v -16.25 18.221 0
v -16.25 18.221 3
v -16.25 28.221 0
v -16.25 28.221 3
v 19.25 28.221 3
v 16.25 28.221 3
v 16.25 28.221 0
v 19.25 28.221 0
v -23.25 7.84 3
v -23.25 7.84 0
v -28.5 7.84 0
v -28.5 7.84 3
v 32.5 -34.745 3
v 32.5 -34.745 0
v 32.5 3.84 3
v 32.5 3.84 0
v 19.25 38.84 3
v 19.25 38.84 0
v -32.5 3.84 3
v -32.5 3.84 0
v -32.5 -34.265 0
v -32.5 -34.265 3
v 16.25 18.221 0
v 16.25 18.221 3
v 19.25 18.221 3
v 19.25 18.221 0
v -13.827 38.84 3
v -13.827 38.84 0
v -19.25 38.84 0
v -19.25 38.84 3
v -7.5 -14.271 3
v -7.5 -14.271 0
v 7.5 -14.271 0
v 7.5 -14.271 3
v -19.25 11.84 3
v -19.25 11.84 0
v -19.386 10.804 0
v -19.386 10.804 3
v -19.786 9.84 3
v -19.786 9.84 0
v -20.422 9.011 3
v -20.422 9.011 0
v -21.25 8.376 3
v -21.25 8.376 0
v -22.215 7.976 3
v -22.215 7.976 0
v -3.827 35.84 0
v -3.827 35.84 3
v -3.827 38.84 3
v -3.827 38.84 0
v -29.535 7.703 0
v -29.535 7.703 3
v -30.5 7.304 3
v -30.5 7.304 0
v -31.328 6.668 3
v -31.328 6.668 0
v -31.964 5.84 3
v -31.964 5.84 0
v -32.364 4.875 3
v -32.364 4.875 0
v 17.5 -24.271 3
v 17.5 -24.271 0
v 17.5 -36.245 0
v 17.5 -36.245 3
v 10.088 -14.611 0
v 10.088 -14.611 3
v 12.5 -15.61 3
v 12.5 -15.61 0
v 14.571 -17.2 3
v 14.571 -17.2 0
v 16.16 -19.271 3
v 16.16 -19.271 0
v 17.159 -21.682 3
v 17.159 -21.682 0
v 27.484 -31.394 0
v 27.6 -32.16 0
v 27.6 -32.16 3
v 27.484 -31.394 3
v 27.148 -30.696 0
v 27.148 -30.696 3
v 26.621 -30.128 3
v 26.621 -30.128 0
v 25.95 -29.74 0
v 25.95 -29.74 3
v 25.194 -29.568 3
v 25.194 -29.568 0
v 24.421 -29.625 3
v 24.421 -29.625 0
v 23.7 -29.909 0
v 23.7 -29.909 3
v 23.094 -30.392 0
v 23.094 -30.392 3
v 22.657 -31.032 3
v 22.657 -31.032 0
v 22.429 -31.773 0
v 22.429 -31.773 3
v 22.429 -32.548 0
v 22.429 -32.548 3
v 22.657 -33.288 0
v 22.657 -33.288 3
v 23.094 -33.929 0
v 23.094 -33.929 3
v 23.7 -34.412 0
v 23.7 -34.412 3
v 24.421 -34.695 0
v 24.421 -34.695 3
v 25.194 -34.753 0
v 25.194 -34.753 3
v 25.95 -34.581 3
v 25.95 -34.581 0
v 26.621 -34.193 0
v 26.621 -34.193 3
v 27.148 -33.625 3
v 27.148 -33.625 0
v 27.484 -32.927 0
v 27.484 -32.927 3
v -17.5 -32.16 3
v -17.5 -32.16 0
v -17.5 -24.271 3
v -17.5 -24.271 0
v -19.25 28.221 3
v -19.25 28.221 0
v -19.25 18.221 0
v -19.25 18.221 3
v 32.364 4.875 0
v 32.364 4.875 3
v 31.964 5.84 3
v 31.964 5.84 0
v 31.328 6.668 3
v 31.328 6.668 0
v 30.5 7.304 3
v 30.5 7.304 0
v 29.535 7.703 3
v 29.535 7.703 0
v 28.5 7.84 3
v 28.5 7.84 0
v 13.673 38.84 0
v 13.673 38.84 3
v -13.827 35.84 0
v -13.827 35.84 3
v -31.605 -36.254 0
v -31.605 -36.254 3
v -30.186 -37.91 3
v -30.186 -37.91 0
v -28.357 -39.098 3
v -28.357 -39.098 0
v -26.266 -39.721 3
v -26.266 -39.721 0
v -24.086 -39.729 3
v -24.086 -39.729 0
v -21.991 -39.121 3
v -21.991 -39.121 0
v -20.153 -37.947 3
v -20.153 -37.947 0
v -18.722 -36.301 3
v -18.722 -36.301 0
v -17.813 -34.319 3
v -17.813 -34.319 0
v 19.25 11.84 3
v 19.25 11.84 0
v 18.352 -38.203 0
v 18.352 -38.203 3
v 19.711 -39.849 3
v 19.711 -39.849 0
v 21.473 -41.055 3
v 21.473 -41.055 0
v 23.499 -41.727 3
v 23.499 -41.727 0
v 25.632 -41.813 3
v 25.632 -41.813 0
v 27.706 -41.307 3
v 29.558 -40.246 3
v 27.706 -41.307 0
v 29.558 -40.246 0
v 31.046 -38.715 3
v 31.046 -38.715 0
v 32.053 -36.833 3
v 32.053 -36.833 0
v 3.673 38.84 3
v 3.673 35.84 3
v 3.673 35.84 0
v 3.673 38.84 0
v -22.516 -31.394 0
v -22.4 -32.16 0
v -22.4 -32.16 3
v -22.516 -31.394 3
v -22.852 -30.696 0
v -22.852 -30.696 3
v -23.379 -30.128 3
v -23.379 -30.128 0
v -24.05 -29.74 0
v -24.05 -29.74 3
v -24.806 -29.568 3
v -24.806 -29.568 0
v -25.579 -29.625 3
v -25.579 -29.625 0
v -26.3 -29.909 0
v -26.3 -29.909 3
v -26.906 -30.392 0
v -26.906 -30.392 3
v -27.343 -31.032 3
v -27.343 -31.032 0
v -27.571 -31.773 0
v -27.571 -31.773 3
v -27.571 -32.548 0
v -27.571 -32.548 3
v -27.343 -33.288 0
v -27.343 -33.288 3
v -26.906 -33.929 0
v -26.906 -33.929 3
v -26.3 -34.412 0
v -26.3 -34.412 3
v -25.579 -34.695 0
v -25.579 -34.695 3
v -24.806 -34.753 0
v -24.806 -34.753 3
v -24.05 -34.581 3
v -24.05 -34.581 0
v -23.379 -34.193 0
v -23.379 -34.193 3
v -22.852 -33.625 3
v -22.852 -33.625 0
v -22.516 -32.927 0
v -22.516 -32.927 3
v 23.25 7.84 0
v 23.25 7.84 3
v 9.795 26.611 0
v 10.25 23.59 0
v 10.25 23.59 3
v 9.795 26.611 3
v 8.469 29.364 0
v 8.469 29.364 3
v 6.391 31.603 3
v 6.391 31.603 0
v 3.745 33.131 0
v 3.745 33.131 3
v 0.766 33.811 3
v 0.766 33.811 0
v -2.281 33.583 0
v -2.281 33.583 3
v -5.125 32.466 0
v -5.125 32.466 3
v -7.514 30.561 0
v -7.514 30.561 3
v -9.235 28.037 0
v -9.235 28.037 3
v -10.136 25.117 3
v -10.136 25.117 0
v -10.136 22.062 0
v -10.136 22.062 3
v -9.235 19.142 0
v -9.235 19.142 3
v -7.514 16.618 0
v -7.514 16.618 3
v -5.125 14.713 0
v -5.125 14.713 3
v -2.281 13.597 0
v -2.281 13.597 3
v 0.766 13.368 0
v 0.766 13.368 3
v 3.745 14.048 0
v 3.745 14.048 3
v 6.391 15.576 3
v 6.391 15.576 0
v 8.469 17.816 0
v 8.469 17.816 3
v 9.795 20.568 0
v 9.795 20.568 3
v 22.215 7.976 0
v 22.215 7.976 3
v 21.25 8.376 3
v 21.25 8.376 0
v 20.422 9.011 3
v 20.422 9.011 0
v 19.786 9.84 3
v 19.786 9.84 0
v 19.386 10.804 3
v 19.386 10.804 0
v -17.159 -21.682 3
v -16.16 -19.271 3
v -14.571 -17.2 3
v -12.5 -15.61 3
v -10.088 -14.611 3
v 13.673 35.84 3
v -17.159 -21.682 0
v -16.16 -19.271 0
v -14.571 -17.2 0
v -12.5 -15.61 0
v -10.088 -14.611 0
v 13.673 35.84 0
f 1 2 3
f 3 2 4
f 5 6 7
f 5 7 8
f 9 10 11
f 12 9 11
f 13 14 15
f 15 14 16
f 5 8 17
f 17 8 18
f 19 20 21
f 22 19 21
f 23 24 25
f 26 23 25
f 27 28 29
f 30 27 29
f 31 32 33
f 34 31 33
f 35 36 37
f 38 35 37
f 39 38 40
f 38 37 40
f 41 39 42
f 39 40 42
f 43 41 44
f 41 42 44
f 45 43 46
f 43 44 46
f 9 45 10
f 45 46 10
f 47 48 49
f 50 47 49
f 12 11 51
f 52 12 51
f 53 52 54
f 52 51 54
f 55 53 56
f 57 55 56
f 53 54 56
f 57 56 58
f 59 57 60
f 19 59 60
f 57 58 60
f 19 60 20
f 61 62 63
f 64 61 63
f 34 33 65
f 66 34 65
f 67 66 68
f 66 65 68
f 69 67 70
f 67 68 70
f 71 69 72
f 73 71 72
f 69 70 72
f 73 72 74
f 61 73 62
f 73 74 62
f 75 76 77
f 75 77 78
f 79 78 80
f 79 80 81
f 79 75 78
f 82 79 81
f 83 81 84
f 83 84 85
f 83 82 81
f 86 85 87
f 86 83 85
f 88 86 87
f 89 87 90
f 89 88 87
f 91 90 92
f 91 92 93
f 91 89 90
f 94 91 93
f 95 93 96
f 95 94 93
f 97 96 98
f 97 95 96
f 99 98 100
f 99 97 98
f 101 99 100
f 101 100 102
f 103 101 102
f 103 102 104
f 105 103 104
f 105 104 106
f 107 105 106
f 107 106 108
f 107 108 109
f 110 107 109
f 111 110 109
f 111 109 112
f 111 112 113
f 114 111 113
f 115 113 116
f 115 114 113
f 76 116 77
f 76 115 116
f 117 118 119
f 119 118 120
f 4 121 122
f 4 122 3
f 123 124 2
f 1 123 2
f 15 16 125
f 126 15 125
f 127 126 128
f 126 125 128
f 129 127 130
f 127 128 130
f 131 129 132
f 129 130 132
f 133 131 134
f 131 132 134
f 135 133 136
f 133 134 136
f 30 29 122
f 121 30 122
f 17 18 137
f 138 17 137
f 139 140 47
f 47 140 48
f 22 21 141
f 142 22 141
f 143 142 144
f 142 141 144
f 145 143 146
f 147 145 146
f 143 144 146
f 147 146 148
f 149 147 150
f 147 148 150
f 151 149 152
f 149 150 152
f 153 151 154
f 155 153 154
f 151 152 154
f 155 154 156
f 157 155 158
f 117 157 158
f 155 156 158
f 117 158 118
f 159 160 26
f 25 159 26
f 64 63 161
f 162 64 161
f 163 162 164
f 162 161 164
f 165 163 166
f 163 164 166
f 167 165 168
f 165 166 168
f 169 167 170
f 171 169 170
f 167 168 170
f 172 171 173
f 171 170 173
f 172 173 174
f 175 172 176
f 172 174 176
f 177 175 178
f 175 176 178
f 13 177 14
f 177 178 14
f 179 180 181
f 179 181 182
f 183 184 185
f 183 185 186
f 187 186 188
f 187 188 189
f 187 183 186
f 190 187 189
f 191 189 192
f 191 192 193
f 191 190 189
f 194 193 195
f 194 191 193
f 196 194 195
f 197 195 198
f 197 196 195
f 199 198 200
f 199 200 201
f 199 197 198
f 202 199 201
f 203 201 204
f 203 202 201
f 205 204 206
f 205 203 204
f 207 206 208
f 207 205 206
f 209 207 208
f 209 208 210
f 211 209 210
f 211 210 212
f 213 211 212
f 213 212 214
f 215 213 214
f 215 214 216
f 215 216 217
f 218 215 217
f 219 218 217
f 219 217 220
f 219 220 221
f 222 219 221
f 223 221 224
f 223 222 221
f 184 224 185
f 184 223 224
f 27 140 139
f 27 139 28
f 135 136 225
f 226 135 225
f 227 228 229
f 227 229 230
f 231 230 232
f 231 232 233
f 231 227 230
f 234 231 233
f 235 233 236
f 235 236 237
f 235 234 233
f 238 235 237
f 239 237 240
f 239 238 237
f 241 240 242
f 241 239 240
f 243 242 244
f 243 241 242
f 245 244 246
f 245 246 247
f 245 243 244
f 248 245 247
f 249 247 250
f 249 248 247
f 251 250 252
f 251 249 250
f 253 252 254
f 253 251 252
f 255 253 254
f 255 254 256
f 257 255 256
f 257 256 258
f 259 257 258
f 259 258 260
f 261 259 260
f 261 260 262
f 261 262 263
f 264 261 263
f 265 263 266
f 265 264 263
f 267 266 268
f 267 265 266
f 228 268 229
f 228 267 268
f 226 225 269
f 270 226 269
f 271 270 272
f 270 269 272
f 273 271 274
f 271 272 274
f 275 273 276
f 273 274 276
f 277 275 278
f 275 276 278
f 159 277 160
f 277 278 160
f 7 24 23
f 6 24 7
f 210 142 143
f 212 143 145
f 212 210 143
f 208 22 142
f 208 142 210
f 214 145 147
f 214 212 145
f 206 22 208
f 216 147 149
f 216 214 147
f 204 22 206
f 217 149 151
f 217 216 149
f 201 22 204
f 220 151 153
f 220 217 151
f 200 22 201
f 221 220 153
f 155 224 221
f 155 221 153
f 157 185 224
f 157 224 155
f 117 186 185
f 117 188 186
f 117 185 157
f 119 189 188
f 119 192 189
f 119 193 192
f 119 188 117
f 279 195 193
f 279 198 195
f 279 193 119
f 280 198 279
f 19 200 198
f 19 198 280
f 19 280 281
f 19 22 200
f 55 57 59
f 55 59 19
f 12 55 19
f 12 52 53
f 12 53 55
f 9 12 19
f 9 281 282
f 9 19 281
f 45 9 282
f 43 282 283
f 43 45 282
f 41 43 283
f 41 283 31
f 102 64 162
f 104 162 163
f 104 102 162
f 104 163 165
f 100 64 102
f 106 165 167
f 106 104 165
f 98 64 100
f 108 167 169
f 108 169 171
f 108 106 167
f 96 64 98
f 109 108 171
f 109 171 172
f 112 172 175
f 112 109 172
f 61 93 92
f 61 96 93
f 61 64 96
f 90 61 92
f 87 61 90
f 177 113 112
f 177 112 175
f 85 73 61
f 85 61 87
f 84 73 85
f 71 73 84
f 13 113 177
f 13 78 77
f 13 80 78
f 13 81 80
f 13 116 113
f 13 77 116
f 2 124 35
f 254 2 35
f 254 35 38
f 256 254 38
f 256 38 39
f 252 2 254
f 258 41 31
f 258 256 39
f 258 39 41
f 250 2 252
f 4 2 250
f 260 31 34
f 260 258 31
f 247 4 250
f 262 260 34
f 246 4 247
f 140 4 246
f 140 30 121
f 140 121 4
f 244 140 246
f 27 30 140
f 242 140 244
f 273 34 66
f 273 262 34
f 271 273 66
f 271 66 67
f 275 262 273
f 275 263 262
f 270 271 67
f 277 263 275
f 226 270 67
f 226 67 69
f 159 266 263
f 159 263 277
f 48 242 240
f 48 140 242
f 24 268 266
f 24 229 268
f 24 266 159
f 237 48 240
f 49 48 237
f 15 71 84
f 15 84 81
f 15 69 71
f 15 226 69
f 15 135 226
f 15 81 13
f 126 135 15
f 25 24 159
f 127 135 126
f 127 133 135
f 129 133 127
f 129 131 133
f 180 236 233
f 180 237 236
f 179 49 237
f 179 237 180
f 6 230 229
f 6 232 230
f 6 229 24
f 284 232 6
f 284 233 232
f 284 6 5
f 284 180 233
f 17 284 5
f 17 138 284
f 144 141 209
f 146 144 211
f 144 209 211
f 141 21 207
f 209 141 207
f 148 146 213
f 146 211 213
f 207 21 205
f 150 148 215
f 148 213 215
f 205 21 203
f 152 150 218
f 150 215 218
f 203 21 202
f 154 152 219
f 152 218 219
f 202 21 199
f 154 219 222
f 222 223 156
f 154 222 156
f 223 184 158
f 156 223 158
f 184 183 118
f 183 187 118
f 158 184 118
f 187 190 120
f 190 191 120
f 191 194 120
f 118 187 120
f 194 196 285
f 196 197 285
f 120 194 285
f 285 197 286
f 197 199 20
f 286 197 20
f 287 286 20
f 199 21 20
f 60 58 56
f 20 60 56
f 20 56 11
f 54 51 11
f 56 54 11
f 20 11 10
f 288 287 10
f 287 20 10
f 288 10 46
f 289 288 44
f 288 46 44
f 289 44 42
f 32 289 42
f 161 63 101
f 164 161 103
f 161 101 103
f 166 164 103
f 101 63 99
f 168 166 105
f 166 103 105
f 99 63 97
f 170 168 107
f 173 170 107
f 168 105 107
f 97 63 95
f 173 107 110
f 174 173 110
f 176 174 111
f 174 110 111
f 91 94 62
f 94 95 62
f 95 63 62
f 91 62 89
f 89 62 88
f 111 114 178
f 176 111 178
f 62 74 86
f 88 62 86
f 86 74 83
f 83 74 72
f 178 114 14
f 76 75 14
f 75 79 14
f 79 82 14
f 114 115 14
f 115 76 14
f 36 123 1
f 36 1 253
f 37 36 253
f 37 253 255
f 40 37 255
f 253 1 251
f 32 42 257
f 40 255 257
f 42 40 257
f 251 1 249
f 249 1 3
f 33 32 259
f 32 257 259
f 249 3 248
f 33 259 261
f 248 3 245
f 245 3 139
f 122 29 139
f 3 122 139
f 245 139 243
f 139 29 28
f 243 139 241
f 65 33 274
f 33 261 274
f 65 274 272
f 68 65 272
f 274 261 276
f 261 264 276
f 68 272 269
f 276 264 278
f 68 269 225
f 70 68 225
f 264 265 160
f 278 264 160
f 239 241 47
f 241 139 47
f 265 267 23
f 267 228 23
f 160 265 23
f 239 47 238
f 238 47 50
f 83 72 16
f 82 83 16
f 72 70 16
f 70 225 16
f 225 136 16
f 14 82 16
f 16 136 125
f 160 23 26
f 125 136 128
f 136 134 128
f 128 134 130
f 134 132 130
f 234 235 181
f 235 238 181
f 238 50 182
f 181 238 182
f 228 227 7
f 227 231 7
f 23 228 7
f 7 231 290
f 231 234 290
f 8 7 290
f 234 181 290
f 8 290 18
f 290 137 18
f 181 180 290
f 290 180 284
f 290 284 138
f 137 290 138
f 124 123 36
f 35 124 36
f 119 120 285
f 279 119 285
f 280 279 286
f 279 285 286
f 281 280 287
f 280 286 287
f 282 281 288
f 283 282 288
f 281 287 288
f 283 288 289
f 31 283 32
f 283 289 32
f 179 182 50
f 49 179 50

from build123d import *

# Parameters (mm, degrees)
SKETCH1_R           = 2.6
SKETCH1_R_2         = 10.25
BOSS_EXTRUDE1_DEPTH = 3
SKETCH2_W           = 3
SKETCH2_H           = 10
SKETCH2_W_2         = 10
SKETCH2_H_2         = 3
CUT_EXTRUDE1_DEPTH  = 3


with BuildPart() as part:
    # Sketch1 → Boss-Extrude1 (new body)
    with BuildSketch(Plane.XY):
        with BuildLine():
            Line((-32.5, -1.160301848), (-32.5, -34.265434942))
            ThreePointArc((-32.5, -34.265434942), (-24.085532921, -39.728848894), (-17.5, -32.160301848))
            Line((-17.5, -32.160301848), (-17.5, -24.27061763))
            ThreePointArc((-17.5, -24.27061763), (-14.571067812, -17.199549819), (-7.5, -14.27061763))
            Line((-7.5, -14.27061763), (7.5, -14.27061763))
            ThreePointArc((7.5, -14.27061763), (14.571067812, -17.199549819), (17.5, -24.27061763))
            Line((17.5, -24.27061763), (17.5, -32.160301848))
            Line((17.5, -32.160301848), (17.5, -36.245484302))
            ThreePointArc((17.5, -36.245484302), (25.631797985, -41.813464149), (32.5, -34.745484302))
            Line((32.5, -34.745484302), (32.5, -33.660301848))
            Line((32.5, -33.660301848), (32.5, -1.160301848))
            Line((32.5, -1.160301848), (32.5, 3.839698152))
            ThreePointArc((32.5, 3.839698152), (31.328427125, 6.668125276), (28.5, 7.839698152))
            Line((28.5, 7.839698152), (23.25, 7.839698152))
            ThreePointArc((23.25, 7.839698152), (20.421572875, 9.011271027), (19.25, 11.839698152))
            Line((19.25, 11.839698152), (19.25, 38.839698152))
            Line((19.25, 38.839698152), (-19.25, 38.839698152))
            Line((-19.25, 38.839698152), (-19.25, 11.839698152))
            ThreePointArc((-19.25, 11.839698152), (-20.421572875, 9.011271027), (-23.25, 7.839698152))
            Line((-23.25, 7.839698152), (-28.5, 7.839698152))
            ThreePointArc((-28.5, 7.839698152), (-31.328427125, 6.668125276), (-32.5, 3.839698152))
            Line((-32.5, 3.839698152), (-32.5, 3.273112401))
            Line((-32.5, 3.273112401), (-32.5, -1.160301848))
        make_face()
        with Locations((-25, -32.160301848)):
            Circle(SKETCH1_R, mode=Mode.SUBTRACT)
        with Locations((25, -32.160301848)):
            Circle(SKETCH1_R, mode=Mode.SUBTRACT)
        with Locations((0, 23.589698152)):
            Circle(SKETCH1_R_2, mode=Mode.SUBTRACT)
    extrude(amount=BOSS_EXTRUDE1_DEPTH)

    # Sketch2 → Cut-Extrude1 (cut)
    with BuildSketch(Plane.XY.offset(3)):
        with Locations((-17.75, 23.22062572)):
            Rectangle(SKETCH2_W, SKETCH2_H)
        with Locations((-8.827421787, 37.339698152)):
            Rectangle(SKETCH2_W_2, SKETCH2_H_2)
        with Locations((8.672578213, 37.339698152)):
            Rectangle(SKETCH2_W_2, SKETCH2_H_2)
        with Locations((17.75, 23.22062572)):
            Rectangle(SKETCH2_W, SKETCH2_H)
    extrude(amount=-CUT_EXTRUDE1_DEPTH, mode=Mode.SUBTRACT)


solid = part.part
